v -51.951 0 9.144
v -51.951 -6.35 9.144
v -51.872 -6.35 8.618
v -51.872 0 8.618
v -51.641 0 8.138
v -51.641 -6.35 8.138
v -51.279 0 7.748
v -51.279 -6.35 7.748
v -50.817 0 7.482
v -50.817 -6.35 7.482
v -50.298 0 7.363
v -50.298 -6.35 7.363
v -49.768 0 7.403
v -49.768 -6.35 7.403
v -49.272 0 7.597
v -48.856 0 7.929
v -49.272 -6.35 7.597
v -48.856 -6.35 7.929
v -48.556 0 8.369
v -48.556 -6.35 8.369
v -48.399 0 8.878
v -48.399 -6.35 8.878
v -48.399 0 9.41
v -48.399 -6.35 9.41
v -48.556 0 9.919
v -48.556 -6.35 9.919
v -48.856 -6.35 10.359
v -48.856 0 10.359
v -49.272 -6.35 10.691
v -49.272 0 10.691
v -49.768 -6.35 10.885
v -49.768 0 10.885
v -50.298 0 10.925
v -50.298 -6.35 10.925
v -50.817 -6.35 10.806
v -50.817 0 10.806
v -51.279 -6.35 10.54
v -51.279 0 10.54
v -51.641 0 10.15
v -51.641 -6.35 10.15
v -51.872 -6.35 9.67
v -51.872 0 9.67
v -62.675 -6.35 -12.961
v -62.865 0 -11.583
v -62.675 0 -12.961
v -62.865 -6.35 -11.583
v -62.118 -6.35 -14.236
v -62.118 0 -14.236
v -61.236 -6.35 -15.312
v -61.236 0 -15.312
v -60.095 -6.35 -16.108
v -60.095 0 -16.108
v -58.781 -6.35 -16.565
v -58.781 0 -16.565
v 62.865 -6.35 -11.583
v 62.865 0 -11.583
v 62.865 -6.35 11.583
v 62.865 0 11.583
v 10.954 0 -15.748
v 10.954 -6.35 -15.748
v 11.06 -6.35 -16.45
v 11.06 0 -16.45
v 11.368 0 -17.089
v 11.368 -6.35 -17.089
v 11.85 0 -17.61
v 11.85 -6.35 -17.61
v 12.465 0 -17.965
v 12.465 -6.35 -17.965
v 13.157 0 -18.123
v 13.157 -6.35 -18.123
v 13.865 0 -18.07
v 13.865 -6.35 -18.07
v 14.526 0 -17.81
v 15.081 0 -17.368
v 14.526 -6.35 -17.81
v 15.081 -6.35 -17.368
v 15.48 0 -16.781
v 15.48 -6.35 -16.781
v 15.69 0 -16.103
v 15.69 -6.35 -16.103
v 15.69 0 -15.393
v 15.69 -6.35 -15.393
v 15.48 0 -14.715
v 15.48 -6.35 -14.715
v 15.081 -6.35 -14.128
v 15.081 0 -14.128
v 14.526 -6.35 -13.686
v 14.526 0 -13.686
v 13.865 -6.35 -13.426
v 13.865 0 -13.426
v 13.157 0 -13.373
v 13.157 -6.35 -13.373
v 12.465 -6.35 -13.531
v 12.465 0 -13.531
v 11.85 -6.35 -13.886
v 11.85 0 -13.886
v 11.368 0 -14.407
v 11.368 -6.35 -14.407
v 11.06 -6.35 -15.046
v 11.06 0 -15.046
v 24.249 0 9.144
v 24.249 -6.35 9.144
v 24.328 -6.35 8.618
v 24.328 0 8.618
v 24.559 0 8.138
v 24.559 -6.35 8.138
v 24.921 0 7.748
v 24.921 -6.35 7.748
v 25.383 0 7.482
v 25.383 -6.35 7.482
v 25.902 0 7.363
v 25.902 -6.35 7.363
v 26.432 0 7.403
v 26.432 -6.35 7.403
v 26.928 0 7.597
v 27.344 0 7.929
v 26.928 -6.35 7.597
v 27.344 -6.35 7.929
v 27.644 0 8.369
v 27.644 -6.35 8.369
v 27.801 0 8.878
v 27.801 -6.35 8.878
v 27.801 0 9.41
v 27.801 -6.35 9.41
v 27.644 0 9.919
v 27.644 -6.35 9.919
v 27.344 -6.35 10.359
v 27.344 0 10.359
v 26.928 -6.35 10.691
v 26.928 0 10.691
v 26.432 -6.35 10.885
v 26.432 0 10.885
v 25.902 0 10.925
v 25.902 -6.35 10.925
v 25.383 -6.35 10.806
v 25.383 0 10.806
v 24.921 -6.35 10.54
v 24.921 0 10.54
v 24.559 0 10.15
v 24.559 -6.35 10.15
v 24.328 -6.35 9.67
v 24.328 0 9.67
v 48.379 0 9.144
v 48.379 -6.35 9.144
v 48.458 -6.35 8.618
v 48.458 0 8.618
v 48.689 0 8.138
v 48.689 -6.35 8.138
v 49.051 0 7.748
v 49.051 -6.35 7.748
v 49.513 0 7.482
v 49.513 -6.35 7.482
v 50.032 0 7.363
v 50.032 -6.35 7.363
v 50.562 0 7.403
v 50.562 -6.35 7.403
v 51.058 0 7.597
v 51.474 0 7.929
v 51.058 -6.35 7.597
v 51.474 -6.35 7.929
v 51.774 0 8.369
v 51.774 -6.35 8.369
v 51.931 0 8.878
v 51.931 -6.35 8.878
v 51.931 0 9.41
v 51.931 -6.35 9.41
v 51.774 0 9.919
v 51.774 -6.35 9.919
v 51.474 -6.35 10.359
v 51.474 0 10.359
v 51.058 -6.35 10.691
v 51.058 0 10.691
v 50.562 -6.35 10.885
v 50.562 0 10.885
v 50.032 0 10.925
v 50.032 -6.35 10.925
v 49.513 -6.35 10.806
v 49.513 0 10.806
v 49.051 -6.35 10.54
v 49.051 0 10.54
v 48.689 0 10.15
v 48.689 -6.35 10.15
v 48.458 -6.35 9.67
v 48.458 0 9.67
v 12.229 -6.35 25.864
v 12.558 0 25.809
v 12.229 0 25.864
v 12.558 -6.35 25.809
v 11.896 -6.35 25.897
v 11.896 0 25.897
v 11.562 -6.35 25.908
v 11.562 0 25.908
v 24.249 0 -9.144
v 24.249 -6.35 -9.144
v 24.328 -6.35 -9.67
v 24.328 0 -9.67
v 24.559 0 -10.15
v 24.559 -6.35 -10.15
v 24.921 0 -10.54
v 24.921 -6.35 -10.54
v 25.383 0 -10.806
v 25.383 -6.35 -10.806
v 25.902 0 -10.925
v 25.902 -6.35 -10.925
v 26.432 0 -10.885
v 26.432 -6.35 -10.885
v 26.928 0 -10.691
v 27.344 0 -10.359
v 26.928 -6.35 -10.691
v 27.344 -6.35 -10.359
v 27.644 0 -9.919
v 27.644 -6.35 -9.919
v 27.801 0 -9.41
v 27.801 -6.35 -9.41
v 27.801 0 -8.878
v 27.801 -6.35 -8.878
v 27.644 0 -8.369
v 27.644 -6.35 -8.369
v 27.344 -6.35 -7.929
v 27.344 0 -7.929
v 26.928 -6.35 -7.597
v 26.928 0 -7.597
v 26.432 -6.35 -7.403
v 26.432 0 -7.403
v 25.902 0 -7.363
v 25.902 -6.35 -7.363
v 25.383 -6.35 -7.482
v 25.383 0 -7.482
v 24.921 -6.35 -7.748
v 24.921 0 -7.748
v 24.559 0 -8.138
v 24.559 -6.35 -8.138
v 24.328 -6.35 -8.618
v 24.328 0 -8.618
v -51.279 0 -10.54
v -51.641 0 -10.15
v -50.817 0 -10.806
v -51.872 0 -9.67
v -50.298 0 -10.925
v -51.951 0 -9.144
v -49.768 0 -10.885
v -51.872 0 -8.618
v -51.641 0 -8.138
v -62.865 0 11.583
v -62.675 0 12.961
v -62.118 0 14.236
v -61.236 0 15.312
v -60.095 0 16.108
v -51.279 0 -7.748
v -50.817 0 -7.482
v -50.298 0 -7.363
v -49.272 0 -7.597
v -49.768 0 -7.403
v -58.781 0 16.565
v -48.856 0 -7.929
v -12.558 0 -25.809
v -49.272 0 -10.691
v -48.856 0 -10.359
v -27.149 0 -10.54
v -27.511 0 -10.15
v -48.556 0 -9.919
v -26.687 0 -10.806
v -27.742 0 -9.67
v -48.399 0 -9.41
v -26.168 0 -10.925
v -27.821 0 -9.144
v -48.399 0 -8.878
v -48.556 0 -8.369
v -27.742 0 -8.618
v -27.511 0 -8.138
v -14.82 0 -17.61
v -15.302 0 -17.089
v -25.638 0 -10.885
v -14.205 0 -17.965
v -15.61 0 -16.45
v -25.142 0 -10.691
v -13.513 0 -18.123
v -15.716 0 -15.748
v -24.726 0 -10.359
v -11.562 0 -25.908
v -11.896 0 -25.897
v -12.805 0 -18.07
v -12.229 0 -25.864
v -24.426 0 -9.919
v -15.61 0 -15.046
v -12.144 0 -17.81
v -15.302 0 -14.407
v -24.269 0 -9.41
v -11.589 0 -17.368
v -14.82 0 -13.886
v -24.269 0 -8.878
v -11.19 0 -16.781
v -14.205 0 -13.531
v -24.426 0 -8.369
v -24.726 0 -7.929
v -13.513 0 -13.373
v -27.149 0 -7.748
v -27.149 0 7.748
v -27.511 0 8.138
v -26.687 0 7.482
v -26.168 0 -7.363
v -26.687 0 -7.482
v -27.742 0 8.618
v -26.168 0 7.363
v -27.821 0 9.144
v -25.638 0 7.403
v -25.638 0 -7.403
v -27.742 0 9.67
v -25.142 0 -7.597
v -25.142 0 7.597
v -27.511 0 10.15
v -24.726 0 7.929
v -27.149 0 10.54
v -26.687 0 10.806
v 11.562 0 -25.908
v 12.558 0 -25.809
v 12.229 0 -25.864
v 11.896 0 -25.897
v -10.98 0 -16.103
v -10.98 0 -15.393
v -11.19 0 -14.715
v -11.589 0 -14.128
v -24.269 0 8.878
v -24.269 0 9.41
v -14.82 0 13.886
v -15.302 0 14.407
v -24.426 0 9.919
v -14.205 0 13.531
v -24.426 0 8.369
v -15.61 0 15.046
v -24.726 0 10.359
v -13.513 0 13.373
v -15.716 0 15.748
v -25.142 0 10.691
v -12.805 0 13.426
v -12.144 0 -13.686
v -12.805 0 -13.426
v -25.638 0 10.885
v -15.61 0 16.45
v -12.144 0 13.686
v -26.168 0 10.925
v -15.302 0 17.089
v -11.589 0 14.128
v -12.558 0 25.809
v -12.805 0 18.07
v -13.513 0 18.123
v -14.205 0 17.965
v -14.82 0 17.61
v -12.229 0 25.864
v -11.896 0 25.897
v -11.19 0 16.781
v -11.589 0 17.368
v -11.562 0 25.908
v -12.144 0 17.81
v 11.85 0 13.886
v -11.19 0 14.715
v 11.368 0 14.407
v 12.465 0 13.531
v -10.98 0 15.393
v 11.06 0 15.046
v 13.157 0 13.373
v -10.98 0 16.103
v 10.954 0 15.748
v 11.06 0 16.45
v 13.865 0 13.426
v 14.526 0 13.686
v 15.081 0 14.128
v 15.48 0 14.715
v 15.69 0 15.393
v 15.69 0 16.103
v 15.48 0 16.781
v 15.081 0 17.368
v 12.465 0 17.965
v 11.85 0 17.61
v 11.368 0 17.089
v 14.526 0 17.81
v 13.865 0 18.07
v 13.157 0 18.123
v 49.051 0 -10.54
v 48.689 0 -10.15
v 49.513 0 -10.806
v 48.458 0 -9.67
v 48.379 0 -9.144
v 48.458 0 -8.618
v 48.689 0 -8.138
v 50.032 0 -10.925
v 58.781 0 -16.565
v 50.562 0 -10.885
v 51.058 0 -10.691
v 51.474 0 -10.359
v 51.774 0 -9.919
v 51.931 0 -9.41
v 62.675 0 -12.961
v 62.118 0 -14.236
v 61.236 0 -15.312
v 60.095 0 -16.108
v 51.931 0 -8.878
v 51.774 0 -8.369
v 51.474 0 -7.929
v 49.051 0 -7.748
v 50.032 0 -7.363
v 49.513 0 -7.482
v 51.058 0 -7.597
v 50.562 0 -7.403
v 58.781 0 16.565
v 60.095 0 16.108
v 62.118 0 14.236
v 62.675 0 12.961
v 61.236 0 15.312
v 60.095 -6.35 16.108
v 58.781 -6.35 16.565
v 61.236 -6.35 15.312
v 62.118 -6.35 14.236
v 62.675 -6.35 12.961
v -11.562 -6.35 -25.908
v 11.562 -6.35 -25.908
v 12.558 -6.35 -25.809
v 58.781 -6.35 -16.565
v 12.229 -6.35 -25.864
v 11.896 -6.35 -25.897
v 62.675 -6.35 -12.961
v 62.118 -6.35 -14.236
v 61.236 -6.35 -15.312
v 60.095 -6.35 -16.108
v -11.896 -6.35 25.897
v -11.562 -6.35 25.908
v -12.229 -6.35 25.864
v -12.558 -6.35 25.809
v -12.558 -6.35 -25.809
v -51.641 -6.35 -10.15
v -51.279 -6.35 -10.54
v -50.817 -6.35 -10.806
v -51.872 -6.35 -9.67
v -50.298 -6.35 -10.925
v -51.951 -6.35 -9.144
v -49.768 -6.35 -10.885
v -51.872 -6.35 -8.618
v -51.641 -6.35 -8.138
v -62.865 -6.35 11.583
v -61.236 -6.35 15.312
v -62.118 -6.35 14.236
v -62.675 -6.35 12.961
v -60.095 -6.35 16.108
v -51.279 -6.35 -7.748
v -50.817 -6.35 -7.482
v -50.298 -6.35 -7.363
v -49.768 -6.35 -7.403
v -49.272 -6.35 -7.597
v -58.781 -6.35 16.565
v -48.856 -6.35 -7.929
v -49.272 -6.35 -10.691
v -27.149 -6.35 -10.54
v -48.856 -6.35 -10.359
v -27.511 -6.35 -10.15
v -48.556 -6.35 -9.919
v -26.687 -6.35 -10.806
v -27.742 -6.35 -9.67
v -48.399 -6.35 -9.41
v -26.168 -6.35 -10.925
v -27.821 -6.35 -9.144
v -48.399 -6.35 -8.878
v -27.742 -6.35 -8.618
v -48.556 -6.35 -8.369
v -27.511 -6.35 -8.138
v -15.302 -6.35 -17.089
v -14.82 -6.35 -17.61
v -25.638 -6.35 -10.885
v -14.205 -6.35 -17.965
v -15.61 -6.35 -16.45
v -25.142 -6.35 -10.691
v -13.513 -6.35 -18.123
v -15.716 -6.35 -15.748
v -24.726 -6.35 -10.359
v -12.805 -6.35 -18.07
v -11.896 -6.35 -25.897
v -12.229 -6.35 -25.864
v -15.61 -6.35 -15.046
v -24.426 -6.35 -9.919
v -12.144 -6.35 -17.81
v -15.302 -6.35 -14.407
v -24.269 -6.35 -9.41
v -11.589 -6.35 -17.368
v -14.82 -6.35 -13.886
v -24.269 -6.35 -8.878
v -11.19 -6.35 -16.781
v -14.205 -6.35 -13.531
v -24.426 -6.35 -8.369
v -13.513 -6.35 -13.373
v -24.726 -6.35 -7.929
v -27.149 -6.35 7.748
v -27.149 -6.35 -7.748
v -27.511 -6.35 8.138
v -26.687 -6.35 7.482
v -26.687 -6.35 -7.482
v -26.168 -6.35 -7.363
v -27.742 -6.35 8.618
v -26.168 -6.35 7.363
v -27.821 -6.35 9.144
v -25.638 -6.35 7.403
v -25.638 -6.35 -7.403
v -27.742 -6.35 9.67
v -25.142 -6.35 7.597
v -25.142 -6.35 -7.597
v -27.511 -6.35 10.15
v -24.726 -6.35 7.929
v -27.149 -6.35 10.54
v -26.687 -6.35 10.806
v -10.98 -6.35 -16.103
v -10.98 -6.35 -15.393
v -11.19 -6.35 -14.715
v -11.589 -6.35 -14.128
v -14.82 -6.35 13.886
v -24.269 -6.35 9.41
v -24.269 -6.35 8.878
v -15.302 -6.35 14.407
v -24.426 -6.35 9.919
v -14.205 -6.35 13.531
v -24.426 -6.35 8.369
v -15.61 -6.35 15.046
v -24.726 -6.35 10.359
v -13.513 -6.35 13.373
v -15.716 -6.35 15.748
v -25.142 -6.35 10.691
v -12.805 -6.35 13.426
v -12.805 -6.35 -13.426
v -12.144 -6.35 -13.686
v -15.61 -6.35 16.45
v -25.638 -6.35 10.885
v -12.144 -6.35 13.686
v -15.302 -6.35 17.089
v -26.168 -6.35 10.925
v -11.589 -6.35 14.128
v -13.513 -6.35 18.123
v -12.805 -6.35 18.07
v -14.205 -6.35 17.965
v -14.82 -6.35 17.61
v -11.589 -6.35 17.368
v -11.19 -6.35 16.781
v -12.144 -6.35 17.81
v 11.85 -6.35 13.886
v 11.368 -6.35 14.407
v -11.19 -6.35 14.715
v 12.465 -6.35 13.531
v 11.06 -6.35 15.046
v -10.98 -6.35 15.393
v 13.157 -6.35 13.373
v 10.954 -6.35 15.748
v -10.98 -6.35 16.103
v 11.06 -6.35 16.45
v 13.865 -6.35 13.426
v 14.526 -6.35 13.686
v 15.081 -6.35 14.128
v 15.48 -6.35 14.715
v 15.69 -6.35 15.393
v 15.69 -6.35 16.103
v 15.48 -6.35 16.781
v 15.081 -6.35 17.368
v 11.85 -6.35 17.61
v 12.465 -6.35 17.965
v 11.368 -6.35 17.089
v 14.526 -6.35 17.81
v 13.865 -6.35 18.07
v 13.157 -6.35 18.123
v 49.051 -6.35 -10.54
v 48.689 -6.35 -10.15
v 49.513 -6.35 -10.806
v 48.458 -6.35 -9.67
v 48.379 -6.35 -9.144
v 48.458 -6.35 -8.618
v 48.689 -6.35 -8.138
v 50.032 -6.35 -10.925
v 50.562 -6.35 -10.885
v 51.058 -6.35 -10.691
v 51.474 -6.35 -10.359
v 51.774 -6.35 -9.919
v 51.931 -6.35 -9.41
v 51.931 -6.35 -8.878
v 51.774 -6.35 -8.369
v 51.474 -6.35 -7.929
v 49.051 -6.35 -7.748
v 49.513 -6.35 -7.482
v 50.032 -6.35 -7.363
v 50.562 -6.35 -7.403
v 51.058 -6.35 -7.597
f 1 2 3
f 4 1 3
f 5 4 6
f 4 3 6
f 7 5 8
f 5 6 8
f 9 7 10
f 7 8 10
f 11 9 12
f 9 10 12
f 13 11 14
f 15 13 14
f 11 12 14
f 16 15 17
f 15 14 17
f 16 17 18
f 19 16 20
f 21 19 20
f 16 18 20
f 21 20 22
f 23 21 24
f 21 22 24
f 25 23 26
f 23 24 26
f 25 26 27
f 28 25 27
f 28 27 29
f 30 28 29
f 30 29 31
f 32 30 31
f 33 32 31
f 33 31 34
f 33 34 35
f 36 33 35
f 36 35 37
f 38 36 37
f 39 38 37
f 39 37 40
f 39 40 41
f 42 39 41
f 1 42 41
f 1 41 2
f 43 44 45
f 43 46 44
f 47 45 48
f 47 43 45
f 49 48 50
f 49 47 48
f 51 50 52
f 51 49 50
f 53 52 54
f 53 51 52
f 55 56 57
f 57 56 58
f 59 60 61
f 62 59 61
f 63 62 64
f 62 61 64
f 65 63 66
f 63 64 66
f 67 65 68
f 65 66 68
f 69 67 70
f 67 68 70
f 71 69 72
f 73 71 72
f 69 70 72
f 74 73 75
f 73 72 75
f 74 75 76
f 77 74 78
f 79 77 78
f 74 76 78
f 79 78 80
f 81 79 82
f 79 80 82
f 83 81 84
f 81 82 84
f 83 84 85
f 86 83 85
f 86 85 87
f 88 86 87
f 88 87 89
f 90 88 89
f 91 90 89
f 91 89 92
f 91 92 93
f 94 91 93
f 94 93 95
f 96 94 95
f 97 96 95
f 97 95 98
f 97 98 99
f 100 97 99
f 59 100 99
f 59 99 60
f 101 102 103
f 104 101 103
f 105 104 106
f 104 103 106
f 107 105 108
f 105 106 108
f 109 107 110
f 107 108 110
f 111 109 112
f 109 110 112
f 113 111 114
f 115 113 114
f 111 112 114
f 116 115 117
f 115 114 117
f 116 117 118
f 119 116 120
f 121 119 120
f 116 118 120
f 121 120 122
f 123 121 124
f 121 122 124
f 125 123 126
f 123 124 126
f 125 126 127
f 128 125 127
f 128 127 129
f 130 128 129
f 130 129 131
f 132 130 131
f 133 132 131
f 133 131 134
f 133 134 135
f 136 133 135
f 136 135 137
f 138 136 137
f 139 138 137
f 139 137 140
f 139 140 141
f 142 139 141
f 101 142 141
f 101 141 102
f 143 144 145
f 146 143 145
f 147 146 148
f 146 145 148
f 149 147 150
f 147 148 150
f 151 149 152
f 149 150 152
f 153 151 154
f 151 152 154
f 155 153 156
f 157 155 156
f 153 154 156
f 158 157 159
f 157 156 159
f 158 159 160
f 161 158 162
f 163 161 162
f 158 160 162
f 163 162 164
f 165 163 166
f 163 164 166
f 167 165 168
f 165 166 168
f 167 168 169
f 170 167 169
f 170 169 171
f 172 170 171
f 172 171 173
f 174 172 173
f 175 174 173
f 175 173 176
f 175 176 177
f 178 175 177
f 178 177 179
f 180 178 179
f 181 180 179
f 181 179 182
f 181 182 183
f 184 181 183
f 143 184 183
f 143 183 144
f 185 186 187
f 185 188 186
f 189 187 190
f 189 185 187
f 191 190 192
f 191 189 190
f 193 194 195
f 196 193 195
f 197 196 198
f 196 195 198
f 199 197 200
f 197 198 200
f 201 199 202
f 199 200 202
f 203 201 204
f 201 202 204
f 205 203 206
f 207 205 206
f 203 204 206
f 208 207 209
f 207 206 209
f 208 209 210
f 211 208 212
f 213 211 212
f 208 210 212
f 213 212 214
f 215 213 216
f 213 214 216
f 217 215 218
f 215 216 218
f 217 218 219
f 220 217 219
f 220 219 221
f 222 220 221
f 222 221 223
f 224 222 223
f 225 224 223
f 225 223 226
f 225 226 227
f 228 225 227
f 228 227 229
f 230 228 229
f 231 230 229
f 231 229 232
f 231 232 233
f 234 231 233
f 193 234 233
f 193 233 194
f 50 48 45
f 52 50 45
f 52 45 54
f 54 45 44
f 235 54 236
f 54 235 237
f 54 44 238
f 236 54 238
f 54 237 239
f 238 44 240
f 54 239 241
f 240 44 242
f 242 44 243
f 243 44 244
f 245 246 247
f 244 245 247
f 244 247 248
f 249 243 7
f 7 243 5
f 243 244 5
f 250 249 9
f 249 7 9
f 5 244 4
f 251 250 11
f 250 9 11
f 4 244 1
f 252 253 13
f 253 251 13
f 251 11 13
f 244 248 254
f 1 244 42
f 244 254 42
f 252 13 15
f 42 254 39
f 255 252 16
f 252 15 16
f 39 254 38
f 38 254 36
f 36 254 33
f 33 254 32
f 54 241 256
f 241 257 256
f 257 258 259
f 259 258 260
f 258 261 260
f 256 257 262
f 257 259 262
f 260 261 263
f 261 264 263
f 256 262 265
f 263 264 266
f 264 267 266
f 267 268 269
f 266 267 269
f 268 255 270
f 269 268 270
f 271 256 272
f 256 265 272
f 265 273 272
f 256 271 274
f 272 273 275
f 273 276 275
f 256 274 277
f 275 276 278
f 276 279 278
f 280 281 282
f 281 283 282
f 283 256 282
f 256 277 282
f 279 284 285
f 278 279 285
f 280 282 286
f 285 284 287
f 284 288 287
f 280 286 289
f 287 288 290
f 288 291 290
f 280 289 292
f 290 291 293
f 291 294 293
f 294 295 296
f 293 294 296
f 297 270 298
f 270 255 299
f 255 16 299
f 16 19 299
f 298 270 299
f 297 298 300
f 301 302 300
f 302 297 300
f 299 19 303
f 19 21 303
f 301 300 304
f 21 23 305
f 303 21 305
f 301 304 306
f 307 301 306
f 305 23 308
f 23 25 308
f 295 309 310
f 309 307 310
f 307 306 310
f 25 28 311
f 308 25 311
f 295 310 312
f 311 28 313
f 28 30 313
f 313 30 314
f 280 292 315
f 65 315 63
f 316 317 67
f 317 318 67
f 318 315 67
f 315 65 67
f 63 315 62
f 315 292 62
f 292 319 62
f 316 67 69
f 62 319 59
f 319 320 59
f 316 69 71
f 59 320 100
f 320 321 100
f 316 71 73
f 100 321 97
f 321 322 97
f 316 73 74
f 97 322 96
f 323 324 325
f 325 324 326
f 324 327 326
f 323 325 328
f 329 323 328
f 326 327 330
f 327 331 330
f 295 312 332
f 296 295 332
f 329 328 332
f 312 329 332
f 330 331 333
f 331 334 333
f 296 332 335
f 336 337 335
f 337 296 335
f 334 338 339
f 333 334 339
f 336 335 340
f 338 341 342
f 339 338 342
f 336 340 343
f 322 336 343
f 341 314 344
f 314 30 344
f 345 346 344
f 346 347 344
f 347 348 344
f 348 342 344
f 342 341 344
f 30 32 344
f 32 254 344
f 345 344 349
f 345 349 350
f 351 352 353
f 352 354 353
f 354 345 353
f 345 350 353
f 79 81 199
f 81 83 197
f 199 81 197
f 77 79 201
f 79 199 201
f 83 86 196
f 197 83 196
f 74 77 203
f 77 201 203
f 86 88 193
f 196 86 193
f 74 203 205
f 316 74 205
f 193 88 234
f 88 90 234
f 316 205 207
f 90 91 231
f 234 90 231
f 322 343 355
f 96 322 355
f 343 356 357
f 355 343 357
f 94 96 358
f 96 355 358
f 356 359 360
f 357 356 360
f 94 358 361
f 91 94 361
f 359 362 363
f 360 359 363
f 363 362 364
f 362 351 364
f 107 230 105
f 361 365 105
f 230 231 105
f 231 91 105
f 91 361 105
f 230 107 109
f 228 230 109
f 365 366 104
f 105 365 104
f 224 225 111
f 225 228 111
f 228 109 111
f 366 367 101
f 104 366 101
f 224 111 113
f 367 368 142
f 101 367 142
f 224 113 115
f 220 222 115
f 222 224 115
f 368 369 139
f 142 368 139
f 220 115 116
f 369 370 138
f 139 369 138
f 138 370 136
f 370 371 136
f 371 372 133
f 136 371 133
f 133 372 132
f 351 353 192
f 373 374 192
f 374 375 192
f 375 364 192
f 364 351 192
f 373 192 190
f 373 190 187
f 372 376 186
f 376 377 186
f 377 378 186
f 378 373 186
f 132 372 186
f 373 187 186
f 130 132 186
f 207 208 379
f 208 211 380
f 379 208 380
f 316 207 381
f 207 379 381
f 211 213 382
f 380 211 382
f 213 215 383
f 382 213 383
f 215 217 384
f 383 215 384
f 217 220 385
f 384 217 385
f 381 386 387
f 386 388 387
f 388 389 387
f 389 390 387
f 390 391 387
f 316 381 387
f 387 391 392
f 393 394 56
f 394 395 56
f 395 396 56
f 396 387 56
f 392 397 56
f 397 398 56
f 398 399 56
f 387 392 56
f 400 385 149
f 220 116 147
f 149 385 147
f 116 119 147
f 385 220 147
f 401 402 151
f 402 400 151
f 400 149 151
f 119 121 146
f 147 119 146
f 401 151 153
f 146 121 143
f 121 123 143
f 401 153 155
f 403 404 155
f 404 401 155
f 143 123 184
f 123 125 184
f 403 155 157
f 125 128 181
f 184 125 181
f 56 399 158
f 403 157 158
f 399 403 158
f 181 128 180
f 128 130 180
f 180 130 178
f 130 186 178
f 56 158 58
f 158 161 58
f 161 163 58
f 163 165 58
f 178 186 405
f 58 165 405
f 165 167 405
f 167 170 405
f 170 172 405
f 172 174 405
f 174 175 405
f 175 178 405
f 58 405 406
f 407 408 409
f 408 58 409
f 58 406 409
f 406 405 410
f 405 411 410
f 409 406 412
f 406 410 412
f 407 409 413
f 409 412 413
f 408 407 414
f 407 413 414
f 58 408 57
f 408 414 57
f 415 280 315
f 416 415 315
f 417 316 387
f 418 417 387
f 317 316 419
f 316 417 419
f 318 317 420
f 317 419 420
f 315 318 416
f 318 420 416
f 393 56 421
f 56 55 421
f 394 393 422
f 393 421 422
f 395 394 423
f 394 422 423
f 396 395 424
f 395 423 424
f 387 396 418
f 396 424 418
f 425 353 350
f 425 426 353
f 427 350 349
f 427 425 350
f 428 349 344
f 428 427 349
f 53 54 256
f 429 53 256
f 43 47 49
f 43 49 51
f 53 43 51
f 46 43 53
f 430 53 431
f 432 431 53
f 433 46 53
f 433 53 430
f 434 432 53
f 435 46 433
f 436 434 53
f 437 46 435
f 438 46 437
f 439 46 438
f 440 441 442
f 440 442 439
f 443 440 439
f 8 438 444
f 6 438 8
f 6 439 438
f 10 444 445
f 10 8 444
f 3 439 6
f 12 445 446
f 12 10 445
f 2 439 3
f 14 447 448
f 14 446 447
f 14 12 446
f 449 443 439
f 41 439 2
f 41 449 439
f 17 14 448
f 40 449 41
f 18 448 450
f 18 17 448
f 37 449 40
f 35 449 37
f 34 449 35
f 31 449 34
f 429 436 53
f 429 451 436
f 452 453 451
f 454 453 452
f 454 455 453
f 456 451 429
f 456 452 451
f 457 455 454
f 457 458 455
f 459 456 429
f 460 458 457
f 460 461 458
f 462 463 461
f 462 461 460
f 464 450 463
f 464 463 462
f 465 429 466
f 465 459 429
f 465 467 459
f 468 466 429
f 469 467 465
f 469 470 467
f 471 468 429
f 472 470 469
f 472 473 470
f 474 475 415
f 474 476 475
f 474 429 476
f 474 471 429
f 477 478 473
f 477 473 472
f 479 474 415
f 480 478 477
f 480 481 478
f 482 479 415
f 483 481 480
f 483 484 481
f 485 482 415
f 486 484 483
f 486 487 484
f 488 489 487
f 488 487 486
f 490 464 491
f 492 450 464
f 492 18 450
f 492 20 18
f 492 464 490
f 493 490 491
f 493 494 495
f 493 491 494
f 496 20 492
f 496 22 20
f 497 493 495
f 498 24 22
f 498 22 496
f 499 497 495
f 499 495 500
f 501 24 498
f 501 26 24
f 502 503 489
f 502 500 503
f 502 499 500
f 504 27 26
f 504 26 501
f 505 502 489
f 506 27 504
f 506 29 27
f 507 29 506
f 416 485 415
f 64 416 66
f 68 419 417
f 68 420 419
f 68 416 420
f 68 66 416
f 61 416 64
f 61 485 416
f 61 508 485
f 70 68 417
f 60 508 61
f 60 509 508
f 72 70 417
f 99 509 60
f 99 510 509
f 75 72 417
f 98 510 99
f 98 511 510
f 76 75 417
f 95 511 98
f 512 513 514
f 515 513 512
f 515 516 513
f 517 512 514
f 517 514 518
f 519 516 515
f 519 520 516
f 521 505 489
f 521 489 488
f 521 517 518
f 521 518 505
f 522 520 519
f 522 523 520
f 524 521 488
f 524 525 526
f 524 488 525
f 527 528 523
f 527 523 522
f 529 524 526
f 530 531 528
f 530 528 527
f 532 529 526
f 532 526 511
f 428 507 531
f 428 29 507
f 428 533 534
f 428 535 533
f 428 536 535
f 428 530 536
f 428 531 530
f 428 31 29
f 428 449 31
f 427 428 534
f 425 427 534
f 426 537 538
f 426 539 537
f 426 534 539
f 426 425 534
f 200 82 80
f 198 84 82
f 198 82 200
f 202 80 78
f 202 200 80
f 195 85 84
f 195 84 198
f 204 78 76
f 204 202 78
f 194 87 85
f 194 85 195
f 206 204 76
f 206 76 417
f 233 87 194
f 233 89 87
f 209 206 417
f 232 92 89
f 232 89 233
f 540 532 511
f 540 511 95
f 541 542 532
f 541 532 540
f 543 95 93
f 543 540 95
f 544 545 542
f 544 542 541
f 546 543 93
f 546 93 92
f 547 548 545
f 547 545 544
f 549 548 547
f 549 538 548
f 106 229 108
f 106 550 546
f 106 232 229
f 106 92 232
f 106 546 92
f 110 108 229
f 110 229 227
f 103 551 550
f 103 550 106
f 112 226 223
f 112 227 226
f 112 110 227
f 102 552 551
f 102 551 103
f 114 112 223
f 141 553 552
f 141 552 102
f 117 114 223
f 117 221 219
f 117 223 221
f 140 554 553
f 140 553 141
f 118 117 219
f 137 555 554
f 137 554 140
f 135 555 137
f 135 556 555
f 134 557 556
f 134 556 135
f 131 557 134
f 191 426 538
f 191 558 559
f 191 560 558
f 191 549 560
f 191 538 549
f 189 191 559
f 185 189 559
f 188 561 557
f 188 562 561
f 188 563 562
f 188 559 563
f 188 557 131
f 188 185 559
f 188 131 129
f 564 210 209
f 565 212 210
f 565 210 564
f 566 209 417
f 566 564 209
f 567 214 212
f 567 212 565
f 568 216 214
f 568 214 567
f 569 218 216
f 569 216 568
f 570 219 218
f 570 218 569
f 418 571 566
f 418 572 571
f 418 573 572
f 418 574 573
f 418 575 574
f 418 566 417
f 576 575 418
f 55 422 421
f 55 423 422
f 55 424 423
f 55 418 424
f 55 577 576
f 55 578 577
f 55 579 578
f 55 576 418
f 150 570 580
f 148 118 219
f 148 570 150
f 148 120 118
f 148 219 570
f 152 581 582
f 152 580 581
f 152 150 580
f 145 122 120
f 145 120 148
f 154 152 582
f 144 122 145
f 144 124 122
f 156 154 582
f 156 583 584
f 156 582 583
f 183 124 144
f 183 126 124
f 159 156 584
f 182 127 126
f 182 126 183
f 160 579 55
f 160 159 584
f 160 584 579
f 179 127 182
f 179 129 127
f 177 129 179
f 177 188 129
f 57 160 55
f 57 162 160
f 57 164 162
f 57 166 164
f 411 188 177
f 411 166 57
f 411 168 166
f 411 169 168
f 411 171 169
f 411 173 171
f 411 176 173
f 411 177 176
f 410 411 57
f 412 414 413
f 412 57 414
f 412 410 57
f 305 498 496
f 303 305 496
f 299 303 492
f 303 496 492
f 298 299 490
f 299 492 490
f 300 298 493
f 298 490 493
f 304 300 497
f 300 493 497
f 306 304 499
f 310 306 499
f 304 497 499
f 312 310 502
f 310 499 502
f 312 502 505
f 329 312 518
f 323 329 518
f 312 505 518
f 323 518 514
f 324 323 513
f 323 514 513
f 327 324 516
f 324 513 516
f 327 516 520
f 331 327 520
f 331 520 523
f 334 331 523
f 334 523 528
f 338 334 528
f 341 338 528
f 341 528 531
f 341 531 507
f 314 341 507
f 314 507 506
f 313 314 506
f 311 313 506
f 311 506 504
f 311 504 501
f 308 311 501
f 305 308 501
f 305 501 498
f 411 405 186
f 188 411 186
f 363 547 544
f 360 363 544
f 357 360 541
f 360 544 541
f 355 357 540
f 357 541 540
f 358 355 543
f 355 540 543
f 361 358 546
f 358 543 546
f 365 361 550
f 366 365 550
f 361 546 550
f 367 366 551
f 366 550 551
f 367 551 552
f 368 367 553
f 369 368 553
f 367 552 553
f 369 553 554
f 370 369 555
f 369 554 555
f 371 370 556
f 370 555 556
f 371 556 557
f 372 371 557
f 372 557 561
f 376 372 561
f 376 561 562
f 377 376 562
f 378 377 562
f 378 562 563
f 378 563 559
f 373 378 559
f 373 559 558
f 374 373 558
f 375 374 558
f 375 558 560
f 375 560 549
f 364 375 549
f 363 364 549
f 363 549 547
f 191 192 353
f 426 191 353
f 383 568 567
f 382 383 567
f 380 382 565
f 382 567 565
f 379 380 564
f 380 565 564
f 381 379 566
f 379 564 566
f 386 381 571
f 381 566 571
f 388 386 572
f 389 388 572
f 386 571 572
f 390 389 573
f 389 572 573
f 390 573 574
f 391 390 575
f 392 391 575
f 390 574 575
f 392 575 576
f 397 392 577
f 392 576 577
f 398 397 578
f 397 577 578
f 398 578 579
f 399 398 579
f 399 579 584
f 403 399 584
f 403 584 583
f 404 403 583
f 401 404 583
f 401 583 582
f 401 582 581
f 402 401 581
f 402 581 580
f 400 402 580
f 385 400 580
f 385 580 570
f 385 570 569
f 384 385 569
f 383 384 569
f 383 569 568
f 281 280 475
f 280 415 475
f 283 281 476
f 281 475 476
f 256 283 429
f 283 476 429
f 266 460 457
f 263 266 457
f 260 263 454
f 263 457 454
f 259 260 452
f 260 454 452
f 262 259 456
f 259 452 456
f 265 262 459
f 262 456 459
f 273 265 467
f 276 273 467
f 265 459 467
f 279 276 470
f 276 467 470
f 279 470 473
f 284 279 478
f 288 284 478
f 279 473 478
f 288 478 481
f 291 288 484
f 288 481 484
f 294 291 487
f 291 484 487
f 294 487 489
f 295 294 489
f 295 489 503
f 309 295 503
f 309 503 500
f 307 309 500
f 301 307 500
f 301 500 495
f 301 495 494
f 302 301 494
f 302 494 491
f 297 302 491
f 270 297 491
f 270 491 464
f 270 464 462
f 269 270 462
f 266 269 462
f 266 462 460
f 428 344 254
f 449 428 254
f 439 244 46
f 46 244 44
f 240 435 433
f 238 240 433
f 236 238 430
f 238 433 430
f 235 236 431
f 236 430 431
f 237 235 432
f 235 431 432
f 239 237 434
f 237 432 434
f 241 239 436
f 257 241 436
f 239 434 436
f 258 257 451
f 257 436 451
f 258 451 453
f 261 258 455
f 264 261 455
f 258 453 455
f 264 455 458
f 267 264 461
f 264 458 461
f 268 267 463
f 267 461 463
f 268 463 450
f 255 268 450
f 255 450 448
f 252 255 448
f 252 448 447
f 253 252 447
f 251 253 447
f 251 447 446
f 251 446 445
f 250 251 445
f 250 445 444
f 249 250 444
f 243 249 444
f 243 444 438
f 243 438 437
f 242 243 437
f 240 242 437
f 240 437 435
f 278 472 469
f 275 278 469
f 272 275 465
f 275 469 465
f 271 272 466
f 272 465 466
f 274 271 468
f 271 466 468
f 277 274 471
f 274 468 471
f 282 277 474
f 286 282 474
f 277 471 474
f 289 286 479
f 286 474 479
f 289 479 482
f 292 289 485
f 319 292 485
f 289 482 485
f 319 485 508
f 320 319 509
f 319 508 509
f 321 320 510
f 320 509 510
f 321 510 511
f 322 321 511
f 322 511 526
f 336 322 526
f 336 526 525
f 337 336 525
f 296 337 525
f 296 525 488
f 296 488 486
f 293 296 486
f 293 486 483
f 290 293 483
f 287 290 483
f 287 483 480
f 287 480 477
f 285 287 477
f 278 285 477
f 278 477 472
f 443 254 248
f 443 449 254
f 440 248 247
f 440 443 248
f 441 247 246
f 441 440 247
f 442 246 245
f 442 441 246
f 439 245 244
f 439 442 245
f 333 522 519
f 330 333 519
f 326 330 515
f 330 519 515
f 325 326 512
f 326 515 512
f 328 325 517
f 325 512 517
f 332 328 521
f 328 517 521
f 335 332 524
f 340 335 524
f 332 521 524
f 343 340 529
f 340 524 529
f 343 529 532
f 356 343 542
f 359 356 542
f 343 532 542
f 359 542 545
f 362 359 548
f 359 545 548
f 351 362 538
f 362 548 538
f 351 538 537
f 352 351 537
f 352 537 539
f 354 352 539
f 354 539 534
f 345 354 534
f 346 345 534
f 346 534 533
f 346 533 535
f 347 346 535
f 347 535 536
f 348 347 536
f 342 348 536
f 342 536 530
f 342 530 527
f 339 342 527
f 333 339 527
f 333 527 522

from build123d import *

# Parameters (mm, degrees)
F1_DEPTH = 6.35
F2_D     = 4.7625
F3_D     = 3.571875
F4_R     = 5.08


with BuildPart() as f1:
    # F0 (on Front) → F1 (new body)
    with BuildSketch(Plane.XZ):
        Polygon((62.865, 15.748), (12.065, 25.908), (-12.065, 25.908), (-62.865, 15.748), (-62.865, -15.748), (-12.065, -25.908), (12.065, -25.908), (62.865, -15.748), align=None)
    extrude(amount=F1_DEPTH)

    # F2 (through all)
    with Locations(Plane(origin=(0, 0, 0), x_dir=(1, 0, 0), z_dir=(0, 1, 0))):
        with Locations((-13.335, -15.748), (13.335, -15.748), (13.335, 15.748), (-13.335, 15.748)):
            Hole(F2_D / 2)

    # F3 (through all)
    with Locations(Plane(origin=(0, 0, 0), x_dir=(1, 0, 0), z_dir=(0, 1, 0))):
        with Locations((26.035, -9.144), (50.165, -9.144), (50.165, 9.144), (26.035, 9.144), (-26.035, 9.144), (-26.035, -9.144), (-50.165, -9.144), (-50.165, 9.144)):
            Hole(F3_D / 2)

    # F4
    f4_edges = [f1.edges().sort_by_distance(p)[0] for p in [
        (-62.865, -3.175, 15.748),
        (62.865, -3.175, -15.748),
        (-62.865, -3.175, -15.748),
        (62.865, -3.175, 15.748),
        (12.065, -3.175, -25.908),
        (12.065, -3.175, 25.908),
        (-12.065, -3.175, -25.908),
        (-12.065, -3.175, 25.908),
    ]]
    fillet(f4_edges, radius=F4_R)


solid = f1.part
